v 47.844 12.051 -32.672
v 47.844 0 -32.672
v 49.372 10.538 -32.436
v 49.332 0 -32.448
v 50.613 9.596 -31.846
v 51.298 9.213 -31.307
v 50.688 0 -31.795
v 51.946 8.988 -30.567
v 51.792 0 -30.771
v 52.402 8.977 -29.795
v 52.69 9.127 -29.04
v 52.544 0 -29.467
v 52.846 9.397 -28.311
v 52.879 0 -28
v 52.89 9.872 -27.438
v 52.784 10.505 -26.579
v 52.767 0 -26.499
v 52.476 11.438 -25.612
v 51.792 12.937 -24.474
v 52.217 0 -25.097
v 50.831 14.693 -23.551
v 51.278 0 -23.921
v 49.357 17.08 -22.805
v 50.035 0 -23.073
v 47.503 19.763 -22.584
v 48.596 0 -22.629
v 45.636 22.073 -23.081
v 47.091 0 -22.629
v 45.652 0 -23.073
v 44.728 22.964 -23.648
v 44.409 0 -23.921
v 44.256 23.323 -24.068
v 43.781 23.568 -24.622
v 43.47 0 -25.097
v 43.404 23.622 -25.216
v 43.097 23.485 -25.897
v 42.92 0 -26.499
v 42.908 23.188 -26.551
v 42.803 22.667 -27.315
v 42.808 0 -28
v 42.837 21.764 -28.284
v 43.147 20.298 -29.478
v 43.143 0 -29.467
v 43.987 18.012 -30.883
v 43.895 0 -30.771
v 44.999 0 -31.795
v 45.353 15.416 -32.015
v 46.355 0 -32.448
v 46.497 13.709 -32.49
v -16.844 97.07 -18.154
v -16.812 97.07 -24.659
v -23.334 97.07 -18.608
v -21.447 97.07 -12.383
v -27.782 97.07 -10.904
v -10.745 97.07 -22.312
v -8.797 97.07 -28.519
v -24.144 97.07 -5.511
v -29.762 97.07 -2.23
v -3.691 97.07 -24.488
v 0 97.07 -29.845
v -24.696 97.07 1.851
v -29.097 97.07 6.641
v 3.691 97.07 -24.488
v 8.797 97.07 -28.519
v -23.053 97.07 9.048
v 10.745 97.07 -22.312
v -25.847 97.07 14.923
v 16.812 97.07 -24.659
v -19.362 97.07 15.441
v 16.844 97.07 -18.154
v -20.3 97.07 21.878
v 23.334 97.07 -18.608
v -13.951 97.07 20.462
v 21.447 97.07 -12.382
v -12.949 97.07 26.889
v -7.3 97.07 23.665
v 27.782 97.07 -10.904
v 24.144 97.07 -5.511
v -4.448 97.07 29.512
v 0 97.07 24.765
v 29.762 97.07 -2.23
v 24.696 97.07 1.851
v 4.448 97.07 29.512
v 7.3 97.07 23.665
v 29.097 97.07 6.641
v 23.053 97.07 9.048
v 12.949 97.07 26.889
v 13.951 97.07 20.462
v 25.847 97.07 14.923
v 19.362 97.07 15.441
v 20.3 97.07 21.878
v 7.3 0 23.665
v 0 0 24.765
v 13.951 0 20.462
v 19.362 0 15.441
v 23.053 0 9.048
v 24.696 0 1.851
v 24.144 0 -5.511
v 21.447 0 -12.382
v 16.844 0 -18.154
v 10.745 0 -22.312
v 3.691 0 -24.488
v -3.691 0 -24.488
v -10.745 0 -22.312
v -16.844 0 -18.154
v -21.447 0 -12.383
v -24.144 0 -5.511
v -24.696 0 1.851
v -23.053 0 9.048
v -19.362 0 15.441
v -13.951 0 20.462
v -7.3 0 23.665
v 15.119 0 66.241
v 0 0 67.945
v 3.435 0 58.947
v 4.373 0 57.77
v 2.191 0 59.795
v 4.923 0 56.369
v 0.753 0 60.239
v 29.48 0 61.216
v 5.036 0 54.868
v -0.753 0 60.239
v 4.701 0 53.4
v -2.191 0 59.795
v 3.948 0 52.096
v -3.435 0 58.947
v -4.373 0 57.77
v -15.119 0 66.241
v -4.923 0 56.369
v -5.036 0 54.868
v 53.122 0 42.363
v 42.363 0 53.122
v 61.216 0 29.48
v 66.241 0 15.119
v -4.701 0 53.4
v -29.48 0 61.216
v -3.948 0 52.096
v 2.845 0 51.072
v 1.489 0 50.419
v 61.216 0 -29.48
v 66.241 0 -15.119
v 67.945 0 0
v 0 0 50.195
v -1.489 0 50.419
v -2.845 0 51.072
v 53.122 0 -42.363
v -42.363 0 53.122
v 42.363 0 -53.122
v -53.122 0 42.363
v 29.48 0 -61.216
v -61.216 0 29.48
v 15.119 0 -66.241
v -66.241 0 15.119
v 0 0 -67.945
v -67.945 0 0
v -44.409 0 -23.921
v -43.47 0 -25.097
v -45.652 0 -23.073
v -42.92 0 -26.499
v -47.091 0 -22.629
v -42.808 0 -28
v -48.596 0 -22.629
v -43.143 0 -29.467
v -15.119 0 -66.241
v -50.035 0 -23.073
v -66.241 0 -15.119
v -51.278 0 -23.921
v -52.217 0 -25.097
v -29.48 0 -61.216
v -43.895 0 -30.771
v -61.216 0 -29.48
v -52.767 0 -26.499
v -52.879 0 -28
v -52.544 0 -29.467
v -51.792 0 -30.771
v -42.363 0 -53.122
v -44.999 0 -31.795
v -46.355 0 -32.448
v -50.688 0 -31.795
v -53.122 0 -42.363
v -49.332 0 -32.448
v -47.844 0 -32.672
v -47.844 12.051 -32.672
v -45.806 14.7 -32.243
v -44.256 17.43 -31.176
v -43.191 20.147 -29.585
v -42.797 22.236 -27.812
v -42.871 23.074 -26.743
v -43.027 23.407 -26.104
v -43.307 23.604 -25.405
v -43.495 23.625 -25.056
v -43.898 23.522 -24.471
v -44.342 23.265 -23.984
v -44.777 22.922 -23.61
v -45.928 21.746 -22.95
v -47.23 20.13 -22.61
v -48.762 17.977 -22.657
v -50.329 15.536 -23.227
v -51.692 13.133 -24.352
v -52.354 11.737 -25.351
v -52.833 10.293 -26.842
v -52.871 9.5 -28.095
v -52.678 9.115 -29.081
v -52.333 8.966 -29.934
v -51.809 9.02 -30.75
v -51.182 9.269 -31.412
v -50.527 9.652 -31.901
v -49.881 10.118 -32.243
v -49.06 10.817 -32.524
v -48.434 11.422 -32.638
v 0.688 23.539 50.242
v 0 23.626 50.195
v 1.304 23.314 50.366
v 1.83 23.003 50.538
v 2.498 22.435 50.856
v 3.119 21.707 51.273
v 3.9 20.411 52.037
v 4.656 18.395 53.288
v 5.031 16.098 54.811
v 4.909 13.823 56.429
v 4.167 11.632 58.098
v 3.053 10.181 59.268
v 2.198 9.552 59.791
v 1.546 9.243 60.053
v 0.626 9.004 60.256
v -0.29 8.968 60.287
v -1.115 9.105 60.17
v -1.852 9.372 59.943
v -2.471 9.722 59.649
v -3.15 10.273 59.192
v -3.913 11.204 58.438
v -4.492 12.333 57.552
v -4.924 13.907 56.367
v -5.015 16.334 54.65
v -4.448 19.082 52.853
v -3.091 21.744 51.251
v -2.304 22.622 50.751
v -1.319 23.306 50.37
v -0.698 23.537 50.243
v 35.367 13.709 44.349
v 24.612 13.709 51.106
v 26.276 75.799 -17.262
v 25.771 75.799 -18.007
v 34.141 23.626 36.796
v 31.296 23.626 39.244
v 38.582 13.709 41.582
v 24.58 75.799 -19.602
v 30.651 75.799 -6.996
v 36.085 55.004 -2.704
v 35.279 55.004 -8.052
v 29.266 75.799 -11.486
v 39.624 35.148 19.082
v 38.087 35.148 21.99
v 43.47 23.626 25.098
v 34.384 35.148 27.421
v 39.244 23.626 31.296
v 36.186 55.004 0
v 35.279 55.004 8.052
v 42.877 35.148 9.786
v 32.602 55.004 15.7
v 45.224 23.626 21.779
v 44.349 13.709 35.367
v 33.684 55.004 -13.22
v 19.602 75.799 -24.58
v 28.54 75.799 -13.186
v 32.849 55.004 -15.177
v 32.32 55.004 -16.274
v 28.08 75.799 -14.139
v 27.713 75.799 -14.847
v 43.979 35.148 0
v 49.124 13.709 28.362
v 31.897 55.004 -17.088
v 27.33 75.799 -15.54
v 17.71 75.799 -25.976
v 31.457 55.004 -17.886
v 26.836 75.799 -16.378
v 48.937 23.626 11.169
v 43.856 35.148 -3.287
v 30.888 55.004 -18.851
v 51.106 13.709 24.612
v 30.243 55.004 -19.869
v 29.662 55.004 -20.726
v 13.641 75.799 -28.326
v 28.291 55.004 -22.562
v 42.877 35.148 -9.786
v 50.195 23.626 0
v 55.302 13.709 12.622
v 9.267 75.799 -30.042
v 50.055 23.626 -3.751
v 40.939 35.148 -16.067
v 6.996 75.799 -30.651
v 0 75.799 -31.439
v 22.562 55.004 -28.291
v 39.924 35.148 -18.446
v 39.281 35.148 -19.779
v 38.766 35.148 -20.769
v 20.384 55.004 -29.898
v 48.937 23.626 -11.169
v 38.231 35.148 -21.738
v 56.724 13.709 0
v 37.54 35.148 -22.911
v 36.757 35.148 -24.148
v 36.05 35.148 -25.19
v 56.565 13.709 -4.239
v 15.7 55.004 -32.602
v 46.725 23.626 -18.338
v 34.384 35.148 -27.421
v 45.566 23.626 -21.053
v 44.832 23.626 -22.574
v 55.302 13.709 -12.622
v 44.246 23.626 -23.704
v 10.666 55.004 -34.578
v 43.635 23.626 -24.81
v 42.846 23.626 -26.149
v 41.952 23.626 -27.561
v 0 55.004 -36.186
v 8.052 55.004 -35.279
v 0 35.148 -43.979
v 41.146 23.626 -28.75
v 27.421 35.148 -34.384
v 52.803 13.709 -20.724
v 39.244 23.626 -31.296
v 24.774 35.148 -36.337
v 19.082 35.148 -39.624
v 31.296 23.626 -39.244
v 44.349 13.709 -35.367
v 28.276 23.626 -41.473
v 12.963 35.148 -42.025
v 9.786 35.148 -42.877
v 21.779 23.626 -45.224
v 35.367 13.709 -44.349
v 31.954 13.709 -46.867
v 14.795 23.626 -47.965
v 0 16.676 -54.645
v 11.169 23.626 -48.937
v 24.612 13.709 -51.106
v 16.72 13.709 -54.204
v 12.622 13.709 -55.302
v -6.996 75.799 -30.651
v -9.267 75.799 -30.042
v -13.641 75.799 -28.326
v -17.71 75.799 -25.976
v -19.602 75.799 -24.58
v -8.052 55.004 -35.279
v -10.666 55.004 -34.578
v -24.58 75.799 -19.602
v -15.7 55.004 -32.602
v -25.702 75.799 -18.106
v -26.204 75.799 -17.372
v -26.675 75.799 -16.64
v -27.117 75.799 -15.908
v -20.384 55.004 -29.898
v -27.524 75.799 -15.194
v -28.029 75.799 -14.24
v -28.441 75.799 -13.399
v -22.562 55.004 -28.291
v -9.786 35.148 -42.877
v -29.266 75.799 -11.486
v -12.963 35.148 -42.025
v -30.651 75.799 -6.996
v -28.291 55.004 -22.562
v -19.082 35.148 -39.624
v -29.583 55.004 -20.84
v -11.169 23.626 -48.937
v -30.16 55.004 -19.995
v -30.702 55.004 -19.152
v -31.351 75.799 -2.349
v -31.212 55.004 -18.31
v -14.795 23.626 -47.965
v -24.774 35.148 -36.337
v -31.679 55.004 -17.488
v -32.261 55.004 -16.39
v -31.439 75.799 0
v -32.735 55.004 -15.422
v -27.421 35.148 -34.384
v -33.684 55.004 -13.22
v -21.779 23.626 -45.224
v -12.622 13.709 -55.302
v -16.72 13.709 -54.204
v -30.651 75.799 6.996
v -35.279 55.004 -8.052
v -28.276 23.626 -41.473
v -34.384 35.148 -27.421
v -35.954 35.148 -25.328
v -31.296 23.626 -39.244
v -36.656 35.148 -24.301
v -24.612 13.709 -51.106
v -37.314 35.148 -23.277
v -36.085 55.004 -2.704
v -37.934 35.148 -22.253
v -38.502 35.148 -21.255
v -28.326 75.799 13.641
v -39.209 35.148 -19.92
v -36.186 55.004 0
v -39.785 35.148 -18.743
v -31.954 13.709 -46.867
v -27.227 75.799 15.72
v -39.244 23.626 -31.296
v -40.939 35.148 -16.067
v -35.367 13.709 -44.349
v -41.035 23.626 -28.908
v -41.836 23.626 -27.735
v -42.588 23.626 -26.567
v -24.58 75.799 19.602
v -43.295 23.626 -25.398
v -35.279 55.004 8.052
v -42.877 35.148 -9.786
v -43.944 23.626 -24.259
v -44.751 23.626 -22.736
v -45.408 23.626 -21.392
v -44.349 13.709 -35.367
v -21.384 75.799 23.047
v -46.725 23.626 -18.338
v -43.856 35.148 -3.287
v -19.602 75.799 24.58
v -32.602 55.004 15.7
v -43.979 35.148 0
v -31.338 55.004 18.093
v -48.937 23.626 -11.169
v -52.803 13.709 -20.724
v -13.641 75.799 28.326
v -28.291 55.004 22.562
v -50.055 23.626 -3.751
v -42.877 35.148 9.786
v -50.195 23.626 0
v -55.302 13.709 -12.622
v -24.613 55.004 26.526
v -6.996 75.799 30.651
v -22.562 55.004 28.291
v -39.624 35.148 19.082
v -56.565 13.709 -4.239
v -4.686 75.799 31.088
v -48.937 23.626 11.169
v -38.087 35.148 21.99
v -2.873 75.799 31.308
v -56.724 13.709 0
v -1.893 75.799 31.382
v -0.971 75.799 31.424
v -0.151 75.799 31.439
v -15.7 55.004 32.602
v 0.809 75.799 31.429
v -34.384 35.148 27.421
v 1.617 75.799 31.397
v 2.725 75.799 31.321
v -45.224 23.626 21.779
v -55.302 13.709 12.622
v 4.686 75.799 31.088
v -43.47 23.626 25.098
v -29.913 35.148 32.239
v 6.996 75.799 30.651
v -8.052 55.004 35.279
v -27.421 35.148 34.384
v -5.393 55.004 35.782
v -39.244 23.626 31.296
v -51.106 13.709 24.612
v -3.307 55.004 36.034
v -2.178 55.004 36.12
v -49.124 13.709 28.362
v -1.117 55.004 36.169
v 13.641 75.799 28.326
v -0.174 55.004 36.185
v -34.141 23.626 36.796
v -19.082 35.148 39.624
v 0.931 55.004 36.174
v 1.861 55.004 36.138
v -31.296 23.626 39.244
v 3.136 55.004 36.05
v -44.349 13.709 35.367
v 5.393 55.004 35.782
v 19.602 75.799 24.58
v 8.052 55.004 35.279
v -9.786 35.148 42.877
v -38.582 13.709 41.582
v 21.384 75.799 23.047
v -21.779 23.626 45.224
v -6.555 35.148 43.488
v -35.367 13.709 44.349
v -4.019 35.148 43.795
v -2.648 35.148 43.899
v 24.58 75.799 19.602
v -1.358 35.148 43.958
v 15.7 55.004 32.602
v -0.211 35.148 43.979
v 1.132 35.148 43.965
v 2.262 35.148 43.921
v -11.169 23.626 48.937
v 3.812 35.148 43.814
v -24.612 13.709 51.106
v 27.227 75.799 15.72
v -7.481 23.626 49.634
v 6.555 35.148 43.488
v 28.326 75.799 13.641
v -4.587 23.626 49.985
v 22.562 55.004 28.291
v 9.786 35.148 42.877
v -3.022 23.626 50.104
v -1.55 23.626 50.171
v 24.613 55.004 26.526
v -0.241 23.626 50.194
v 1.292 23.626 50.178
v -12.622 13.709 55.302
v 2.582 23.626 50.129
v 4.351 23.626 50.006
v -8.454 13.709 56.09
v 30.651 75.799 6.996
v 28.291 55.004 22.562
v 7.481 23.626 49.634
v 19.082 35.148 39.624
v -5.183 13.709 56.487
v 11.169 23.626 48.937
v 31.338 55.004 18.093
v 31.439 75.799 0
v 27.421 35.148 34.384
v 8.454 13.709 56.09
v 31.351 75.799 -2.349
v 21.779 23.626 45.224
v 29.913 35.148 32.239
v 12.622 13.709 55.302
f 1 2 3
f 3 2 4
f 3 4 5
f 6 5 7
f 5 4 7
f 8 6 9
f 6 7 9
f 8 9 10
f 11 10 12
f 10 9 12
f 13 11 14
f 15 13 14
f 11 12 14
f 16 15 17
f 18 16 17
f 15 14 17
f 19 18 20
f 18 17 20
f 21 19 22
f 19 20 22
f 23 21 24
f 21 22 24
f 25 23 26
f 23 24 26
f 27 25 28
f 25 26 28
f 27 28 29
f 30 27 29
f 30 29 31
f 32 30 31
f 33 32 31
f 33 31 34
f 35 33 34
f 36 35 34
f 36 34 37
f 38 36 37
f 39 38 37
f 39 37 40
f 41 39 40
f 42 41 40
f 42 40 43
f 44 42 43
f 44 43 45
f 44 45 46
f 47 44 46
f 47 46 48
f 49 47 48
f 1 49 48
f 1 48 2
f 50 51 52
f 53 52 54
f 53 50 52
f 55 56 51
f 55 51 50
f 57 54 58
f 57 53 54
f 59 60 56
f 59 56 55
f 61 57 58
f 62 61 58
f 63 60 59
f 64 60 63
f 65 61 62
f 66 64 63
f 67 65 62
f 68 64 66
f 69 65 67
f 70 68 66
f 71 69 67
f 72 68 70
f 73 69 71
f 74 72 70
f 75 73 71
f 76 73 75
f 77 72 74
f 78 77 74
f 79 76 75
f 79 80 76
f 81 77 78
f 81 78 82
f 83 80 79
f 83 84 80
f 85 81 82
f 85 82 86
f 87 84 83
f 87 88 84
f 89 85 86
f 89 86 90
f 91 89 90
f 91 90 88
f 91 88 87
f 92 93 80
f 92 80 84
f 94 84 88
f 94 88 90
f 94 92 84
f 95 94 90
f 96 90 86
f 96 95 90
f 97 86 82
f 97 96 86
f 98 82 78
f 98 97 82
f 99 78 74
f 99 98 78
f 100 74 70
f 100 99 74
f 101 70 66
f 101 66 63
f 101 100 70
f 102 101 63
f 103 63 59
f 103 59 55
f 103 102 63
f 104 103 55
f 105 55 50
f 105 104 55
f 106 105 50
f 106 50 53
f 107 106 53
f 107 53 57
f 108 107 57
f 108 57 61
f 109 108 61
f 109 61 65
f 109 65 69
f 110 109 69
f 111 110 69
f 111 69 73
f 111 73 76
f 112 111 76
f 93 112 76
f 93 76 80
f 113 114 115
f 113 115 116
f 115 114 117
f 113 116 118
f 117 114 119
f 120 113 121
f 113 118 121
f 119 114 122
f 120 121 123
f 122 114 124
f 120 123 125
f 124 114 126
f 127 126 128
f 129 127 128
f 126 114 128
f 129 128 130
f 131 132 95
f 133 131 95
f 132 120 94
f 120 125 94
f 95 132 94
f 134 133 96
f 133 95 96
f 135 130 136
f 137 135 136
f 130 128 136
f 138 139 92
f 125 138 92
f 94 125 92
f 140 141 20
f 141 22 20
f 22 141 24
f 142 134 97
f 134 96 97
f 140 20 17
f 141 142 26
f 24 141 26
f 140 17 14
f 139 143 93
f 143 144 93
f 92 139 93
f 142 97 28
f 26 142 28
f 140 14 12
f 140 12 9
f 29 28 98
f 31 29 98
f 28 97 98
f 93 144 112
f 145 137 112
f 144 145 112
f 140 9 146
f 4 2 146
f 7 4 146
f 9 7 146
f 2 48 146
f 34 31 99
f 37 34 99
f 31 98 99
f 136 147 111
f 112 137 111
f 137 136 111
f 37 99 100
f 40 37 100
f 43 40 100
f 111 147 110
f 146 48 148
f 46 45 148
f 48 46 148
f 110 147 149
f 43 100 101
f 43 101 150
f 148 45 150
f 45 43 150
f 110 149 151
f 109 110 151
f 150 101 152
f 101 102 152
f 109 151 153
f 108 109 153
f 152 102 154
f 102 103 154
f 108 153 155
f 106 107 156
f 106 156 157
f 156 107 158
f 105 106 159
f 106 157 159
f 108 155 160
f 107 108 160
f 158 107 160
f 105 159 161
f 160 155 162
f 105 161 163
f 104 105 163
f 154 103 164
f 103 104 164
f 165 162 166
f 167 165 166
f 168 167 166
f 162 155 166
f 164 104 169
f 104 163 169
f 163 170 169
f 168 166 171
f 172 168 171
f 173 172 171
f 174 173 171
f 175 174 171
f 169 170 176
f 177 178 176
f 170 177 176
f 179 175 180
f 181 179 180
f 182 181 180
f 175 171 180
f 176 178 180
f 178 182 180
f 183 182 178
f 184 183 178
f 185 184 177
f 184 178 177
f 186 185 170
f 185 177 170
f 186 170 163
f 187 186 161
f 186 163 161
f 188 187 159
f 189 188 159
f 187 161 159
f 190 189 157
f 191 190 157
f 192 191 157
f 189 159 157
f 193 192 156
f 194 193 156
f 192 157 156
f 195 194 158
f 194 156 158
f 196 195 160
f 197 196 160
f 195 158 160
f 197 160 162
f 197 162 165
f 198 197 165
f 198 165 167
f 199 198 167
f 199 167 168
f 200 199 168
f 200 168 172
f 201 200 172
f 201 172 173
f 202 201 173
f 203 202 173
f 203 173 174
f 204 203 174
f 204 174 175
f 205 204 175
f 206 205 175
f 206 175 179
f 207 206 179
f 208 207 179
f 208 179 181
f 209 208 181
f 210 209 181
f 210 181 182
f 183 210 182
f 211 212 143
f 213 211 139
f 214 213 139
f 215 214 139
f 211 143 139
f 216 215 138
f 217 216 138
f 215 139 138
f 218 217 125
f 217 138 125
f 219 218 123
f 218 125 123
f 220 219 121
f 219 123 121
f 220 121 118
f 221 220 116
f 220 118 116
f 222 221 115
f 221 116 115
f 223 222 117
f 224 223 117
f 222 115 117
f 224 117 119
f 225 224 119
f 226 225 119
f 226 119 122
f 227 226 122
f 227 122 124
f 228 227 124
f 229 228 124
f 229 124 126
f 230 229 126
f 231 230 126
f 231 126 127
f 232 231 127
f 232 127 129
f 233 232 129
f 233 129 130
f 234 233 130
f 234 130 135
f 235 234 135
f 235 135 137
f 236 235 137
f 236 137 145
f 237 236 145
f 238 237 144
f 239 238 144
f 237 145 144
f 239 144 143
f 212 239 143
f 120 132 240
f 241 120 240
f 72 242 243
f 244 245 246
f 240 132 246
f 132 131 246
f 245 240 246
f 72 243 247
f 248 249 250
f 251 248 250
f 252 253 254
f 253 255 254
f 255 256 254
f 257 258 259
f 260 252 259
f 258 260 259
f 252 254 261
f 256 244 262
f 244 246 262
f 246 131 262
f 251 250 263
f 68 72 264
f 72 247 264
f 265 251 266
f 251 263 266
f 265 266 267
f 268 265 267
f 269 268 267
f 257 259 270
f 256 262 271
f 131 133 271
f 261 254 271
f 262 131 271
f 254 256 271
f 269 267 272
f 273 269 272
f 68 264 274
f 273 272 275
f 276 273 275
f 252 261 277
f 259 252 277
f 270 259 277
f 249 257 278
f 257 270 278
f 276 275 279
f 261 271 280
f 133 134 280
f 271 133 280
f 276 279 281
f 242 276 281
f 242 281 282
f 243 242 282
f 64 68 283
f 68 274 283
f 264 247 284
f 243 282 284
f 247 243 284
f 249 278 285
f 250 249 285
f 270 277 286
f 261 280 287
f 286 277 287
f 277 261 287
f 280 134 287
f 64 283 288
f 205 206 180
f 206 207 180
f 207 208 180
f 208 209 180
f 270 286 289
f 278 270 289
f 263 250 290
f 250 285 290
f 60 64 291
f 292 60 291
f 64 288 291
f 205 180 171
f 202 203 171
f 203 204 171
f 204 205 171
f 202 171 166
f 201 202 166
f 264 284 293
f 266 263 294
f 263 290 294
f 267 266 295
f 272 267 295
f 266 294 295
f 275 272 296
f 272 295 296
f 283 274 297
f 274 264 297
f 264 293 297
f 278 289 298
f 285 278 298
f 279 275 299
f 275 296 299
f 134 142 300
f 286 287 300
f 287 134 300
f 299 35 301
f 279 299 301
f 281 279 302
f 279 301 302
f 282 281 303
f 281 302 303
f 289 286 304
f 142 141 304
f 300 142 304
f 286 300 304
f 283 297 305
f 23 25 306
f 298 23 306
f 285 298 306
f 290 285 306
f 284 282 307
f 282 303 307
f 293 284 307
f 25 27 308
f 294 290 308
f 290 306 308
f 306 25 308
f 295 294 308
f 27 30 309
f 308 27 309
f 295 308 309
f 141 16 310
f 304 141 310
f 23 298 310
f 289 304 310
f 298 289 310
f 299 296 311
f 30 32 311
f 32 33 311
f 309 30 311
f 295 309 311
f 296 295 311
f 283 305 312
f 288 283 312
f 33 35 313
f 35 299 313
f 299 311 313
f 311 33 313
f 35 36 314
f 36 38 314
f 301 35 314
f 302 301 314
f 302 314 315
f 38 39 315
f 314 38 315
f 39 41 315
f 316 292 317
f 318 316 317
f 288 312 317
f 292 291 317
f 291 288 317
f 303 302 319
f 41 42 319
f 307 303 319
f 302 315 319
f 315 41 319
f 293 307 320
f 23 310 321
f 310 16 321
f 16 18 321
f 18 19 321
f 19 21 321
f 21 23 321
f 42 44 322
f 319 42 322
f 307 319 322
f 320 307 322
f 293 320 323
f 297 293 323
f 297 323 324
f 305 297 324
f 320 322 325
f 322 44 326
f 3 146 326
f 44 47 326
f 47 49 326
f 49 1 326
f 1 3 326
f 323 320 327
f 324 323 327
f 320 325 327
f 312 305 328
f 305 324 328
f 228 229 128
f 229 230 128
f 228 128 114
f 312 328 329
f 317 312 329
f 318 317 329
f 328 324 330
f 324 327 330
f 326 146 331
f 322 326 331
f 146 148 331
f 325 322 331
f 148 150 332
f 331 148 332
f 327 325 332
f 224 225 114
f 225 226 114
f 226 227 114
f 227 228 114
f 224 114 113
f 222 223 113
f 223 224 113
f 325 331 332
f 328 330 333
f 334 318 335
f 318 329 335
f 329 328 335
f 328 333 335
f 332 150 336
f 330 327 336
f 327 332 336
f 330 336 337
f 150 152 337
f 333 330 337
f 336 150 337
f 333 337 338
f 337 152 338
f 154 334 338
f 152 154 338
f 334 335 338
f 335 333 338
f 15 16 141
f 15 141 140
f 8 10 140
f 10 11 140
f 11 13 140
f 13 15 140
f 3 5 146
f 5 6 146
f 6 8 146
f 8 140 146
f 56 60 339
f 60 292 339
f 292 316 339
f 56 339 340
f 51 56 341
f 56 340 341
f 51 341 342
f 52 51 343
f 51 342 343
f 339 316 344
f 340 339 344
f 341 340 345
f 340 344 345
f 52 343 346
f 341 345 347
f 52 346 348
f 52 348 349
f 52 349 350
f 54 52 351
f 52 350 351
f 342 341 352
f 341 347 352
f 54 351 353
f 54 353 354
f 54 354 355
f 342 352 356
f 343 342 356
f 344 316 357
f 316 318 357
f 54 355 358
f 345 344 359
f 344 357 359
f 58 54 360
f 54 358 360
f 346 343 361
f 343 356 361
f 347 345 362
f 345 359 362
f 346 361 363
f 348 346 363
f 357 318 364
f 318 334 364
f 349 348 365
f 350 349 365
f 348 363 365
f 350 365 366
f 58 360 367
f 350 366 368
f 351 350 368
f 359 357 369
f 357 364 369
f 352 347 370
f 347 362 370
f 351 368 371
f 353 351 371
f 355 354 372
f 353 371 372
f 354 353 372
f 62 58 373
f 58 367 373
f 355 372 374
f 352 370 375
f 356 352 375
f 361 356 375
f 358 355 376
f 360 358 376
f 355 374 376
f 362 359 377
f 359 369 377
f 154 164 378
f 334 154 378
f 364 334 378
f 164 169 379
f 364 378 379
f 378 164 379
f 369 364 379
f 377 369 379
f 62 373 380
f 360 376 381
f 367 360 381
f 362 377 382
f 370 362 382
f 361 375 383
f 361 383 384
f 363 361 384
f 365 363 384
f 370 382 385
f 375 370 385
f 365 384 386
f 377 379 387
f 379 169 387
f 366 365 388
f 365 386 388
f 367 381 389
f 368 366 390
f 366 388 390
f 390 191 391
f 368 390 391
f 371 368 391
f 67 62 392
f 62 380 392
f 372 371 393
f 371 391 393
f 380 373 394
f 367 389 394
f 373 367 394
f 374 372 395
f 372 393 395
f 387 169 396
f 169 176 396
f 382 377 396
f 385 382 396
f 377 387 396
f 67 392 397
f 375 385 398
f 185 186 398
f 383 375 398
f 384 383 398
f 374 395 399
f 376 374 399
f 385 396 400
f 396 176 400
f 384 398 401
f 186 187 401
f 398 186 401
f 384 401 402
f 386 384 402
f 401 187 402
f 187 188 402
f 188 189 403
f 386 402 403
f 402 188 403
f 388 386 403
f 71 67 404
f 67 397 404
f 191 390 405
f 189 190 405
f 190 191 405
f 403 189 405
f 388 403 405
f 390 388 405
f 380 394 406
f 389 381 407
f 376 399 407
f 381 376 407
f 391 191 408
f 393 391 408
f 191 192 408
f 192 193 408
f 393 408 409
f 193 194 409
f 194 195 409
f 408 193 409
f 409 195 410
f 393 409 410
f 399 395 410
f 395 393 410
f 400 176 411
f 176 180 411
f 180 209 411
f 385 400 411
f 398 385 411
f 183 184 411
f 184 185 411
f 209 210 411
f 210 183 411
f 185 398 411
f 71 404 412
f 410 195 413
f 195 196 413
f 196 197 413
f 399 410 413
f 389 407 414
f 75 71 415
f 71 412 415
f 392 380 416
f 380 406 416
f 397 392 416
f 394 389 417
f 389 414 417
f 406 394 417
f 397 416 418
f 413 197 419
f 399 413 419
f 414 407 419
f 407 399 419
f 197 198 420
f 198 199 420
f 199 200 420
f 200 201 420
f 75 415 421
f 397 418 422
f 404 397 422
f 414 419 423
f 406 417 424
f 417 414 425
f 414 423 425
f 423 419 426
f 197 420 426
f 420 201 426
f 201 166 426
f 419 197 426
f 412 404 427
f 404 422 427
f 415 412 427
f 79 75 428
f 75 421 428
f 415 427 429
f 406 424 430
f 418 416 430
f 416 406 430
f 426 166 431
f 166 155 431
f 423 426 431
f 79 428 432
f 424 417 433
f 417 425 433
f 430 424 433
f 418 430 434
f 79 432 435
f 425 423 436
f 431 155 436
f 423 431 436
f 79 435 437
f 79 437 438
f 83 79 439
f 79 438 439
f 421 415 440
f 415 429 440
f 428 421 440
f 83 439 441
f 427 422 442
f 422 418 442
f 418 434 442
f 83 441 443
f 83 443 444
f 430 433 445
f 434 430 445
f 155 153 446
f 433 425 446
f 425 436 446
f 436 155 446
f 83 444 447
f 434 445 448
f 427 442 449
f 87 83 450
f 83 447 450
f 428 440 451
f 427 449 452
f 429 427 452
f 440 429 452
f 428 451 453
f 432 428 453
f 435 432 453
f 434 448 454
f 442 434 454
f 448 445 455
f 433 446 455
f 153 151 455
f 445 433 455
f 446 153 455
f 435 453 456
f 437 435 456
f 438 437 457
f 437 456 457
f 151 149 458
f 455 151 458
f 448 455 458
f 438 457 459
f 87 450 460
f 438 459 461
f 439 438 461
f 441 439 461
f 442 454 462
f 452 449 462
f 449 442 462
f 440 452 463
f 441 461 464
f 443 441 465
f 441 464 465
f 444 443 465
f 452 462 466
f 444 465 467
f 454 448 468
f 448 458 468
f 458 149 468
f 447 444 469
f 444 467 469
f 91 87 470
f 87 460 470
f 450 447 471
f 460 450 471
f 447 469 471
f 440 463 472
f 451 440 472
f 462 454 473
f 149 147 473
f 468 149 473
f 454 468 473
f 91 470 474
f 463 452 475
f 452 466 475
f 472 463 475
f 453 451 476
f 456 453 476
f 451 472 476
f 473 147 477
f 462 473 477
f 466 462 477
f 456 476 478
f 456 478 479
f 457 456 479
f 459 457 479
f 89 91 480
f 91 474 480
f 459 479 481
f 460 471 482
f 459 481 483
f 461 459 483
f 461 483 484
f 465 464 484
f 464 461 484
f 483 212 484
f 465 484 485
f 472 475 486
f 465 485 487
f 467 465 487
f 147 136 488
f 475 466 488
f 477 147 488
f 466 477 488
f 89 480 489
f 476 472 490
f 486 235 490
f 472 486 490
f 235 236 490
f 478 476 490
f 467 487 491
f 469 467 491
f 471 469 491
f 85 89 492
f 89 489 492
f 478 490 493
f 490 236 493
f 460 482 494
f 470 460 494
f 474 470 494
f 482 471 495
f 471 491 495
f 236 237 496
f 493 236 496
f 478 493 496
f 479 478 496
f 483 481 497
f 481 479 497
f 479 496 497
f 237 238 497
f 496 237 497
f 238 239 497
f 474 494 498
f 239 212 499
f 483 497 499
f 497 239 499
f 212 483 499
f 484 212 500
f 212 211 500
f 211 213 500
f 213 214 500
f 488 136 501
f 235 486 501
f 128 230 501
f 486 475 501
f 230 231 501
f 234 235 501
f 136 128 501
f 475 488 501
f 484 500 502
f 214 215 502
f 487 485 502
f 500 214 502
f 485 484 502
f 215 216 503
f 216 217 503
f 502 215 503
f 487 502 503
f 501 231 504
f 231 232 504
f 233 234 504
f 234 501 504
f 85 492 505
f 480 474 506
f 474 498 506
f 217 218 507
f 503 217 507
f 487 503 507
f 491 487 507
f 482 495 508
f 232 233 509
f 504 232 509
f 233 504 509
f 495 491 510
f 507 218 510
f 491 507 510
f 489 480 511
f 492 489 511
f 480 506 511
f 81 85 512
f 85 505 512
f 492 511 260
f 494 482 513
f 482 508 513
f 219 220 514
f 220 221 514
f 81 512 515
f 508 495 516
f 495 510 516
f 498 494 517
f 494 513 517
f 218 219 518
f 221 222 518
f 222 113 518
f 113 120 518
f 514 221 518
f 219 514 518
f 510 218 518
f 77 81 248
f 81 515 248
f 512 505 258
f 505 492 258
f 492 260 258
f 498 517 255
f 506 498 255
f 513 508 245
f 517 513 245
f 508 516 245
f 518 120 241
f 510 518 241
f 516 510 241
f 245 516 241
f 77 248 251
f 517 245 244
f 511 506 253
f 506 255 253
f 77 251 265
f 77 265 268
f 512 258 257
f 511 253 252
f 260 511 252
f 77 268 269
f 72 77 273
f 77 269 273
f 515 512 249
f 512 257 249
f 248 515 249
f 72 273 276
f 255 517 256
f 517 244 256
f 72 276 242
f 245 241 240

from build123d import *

# Parameters (mm, degrees)
SKETCH1_R           = 29.845
SKETCH1_R_2         = 24.765
BOSS_EXTRUDE1_DEPTH = 97.07
SKETCH4_R           = 24.765
SKETCH4_R_2         = 5.05
CUT_EXTRUDE1_DEPTH  = 95


with BuildPart() as part:
    # Sketch1 → Boss-Extrude1 (new body)
    with BuildSketch(Plane(origin=(0, 0, 0), x_dir=(1, 0, 0), z_dir=(0, 1, 0))):
        with Locations(Location((0, 0, 0), (0, 0, 270))):
            Circle(SKETCH1_R)
        with Locations(Location((0, 0, 0), (0, 0, 270))):
            Circle(SKETCH1_R_2, mode=Mode.SUBTRACT)
    extrude(amount=BOSS_EXTRUDE1_DEPTH)

    # Sketch3 → Revolve1 (revolve)
    with BuildSketch(Plane.XY, mode=Mode.PRIVATE) as revolve1_sk:
        with BuildLine():
            Line((67.945, 0), (29.845, 0))
            Line((29.845, 0), (29.845, 97.07))
            ThreePointArc((29.845, 97.07), (39.711046991, 44.930296079), (67.945, 0))
        make_face()
    revolve(revolve1_sk.sketch.rotate(Axis((0, 0, 0), (0, 1, 0)), 90), axis=Axis((0, 0, 0), (0, 1, 0)))

    # Sketch4 → Cut-Extrude1 (cut)
    with BuildSketch(Plane.XZ):
        with Locations(Location((0, 0, 0), (0, 0, 90))):
            Circle(SKETCH4_R)
        with Locations(Location((0, 55.245, 0), (0, 0, 270))):
            Circle(SKETCH4_R_2)
        with Locations(Location((47.843573432, -27.6225, 0), (0, 0, 270))):
            Circle(SKETCH4_R_2)
        with Locations(Location((-47.843573432, -27.6225, 0), (0, 0, 270))):
            Circle(SKETCH4_R_2)
    extrude(amount=-CUT_EXTRUDE1_DEPTH, mode=Mode.SUBTRACT)


solid = part.part
